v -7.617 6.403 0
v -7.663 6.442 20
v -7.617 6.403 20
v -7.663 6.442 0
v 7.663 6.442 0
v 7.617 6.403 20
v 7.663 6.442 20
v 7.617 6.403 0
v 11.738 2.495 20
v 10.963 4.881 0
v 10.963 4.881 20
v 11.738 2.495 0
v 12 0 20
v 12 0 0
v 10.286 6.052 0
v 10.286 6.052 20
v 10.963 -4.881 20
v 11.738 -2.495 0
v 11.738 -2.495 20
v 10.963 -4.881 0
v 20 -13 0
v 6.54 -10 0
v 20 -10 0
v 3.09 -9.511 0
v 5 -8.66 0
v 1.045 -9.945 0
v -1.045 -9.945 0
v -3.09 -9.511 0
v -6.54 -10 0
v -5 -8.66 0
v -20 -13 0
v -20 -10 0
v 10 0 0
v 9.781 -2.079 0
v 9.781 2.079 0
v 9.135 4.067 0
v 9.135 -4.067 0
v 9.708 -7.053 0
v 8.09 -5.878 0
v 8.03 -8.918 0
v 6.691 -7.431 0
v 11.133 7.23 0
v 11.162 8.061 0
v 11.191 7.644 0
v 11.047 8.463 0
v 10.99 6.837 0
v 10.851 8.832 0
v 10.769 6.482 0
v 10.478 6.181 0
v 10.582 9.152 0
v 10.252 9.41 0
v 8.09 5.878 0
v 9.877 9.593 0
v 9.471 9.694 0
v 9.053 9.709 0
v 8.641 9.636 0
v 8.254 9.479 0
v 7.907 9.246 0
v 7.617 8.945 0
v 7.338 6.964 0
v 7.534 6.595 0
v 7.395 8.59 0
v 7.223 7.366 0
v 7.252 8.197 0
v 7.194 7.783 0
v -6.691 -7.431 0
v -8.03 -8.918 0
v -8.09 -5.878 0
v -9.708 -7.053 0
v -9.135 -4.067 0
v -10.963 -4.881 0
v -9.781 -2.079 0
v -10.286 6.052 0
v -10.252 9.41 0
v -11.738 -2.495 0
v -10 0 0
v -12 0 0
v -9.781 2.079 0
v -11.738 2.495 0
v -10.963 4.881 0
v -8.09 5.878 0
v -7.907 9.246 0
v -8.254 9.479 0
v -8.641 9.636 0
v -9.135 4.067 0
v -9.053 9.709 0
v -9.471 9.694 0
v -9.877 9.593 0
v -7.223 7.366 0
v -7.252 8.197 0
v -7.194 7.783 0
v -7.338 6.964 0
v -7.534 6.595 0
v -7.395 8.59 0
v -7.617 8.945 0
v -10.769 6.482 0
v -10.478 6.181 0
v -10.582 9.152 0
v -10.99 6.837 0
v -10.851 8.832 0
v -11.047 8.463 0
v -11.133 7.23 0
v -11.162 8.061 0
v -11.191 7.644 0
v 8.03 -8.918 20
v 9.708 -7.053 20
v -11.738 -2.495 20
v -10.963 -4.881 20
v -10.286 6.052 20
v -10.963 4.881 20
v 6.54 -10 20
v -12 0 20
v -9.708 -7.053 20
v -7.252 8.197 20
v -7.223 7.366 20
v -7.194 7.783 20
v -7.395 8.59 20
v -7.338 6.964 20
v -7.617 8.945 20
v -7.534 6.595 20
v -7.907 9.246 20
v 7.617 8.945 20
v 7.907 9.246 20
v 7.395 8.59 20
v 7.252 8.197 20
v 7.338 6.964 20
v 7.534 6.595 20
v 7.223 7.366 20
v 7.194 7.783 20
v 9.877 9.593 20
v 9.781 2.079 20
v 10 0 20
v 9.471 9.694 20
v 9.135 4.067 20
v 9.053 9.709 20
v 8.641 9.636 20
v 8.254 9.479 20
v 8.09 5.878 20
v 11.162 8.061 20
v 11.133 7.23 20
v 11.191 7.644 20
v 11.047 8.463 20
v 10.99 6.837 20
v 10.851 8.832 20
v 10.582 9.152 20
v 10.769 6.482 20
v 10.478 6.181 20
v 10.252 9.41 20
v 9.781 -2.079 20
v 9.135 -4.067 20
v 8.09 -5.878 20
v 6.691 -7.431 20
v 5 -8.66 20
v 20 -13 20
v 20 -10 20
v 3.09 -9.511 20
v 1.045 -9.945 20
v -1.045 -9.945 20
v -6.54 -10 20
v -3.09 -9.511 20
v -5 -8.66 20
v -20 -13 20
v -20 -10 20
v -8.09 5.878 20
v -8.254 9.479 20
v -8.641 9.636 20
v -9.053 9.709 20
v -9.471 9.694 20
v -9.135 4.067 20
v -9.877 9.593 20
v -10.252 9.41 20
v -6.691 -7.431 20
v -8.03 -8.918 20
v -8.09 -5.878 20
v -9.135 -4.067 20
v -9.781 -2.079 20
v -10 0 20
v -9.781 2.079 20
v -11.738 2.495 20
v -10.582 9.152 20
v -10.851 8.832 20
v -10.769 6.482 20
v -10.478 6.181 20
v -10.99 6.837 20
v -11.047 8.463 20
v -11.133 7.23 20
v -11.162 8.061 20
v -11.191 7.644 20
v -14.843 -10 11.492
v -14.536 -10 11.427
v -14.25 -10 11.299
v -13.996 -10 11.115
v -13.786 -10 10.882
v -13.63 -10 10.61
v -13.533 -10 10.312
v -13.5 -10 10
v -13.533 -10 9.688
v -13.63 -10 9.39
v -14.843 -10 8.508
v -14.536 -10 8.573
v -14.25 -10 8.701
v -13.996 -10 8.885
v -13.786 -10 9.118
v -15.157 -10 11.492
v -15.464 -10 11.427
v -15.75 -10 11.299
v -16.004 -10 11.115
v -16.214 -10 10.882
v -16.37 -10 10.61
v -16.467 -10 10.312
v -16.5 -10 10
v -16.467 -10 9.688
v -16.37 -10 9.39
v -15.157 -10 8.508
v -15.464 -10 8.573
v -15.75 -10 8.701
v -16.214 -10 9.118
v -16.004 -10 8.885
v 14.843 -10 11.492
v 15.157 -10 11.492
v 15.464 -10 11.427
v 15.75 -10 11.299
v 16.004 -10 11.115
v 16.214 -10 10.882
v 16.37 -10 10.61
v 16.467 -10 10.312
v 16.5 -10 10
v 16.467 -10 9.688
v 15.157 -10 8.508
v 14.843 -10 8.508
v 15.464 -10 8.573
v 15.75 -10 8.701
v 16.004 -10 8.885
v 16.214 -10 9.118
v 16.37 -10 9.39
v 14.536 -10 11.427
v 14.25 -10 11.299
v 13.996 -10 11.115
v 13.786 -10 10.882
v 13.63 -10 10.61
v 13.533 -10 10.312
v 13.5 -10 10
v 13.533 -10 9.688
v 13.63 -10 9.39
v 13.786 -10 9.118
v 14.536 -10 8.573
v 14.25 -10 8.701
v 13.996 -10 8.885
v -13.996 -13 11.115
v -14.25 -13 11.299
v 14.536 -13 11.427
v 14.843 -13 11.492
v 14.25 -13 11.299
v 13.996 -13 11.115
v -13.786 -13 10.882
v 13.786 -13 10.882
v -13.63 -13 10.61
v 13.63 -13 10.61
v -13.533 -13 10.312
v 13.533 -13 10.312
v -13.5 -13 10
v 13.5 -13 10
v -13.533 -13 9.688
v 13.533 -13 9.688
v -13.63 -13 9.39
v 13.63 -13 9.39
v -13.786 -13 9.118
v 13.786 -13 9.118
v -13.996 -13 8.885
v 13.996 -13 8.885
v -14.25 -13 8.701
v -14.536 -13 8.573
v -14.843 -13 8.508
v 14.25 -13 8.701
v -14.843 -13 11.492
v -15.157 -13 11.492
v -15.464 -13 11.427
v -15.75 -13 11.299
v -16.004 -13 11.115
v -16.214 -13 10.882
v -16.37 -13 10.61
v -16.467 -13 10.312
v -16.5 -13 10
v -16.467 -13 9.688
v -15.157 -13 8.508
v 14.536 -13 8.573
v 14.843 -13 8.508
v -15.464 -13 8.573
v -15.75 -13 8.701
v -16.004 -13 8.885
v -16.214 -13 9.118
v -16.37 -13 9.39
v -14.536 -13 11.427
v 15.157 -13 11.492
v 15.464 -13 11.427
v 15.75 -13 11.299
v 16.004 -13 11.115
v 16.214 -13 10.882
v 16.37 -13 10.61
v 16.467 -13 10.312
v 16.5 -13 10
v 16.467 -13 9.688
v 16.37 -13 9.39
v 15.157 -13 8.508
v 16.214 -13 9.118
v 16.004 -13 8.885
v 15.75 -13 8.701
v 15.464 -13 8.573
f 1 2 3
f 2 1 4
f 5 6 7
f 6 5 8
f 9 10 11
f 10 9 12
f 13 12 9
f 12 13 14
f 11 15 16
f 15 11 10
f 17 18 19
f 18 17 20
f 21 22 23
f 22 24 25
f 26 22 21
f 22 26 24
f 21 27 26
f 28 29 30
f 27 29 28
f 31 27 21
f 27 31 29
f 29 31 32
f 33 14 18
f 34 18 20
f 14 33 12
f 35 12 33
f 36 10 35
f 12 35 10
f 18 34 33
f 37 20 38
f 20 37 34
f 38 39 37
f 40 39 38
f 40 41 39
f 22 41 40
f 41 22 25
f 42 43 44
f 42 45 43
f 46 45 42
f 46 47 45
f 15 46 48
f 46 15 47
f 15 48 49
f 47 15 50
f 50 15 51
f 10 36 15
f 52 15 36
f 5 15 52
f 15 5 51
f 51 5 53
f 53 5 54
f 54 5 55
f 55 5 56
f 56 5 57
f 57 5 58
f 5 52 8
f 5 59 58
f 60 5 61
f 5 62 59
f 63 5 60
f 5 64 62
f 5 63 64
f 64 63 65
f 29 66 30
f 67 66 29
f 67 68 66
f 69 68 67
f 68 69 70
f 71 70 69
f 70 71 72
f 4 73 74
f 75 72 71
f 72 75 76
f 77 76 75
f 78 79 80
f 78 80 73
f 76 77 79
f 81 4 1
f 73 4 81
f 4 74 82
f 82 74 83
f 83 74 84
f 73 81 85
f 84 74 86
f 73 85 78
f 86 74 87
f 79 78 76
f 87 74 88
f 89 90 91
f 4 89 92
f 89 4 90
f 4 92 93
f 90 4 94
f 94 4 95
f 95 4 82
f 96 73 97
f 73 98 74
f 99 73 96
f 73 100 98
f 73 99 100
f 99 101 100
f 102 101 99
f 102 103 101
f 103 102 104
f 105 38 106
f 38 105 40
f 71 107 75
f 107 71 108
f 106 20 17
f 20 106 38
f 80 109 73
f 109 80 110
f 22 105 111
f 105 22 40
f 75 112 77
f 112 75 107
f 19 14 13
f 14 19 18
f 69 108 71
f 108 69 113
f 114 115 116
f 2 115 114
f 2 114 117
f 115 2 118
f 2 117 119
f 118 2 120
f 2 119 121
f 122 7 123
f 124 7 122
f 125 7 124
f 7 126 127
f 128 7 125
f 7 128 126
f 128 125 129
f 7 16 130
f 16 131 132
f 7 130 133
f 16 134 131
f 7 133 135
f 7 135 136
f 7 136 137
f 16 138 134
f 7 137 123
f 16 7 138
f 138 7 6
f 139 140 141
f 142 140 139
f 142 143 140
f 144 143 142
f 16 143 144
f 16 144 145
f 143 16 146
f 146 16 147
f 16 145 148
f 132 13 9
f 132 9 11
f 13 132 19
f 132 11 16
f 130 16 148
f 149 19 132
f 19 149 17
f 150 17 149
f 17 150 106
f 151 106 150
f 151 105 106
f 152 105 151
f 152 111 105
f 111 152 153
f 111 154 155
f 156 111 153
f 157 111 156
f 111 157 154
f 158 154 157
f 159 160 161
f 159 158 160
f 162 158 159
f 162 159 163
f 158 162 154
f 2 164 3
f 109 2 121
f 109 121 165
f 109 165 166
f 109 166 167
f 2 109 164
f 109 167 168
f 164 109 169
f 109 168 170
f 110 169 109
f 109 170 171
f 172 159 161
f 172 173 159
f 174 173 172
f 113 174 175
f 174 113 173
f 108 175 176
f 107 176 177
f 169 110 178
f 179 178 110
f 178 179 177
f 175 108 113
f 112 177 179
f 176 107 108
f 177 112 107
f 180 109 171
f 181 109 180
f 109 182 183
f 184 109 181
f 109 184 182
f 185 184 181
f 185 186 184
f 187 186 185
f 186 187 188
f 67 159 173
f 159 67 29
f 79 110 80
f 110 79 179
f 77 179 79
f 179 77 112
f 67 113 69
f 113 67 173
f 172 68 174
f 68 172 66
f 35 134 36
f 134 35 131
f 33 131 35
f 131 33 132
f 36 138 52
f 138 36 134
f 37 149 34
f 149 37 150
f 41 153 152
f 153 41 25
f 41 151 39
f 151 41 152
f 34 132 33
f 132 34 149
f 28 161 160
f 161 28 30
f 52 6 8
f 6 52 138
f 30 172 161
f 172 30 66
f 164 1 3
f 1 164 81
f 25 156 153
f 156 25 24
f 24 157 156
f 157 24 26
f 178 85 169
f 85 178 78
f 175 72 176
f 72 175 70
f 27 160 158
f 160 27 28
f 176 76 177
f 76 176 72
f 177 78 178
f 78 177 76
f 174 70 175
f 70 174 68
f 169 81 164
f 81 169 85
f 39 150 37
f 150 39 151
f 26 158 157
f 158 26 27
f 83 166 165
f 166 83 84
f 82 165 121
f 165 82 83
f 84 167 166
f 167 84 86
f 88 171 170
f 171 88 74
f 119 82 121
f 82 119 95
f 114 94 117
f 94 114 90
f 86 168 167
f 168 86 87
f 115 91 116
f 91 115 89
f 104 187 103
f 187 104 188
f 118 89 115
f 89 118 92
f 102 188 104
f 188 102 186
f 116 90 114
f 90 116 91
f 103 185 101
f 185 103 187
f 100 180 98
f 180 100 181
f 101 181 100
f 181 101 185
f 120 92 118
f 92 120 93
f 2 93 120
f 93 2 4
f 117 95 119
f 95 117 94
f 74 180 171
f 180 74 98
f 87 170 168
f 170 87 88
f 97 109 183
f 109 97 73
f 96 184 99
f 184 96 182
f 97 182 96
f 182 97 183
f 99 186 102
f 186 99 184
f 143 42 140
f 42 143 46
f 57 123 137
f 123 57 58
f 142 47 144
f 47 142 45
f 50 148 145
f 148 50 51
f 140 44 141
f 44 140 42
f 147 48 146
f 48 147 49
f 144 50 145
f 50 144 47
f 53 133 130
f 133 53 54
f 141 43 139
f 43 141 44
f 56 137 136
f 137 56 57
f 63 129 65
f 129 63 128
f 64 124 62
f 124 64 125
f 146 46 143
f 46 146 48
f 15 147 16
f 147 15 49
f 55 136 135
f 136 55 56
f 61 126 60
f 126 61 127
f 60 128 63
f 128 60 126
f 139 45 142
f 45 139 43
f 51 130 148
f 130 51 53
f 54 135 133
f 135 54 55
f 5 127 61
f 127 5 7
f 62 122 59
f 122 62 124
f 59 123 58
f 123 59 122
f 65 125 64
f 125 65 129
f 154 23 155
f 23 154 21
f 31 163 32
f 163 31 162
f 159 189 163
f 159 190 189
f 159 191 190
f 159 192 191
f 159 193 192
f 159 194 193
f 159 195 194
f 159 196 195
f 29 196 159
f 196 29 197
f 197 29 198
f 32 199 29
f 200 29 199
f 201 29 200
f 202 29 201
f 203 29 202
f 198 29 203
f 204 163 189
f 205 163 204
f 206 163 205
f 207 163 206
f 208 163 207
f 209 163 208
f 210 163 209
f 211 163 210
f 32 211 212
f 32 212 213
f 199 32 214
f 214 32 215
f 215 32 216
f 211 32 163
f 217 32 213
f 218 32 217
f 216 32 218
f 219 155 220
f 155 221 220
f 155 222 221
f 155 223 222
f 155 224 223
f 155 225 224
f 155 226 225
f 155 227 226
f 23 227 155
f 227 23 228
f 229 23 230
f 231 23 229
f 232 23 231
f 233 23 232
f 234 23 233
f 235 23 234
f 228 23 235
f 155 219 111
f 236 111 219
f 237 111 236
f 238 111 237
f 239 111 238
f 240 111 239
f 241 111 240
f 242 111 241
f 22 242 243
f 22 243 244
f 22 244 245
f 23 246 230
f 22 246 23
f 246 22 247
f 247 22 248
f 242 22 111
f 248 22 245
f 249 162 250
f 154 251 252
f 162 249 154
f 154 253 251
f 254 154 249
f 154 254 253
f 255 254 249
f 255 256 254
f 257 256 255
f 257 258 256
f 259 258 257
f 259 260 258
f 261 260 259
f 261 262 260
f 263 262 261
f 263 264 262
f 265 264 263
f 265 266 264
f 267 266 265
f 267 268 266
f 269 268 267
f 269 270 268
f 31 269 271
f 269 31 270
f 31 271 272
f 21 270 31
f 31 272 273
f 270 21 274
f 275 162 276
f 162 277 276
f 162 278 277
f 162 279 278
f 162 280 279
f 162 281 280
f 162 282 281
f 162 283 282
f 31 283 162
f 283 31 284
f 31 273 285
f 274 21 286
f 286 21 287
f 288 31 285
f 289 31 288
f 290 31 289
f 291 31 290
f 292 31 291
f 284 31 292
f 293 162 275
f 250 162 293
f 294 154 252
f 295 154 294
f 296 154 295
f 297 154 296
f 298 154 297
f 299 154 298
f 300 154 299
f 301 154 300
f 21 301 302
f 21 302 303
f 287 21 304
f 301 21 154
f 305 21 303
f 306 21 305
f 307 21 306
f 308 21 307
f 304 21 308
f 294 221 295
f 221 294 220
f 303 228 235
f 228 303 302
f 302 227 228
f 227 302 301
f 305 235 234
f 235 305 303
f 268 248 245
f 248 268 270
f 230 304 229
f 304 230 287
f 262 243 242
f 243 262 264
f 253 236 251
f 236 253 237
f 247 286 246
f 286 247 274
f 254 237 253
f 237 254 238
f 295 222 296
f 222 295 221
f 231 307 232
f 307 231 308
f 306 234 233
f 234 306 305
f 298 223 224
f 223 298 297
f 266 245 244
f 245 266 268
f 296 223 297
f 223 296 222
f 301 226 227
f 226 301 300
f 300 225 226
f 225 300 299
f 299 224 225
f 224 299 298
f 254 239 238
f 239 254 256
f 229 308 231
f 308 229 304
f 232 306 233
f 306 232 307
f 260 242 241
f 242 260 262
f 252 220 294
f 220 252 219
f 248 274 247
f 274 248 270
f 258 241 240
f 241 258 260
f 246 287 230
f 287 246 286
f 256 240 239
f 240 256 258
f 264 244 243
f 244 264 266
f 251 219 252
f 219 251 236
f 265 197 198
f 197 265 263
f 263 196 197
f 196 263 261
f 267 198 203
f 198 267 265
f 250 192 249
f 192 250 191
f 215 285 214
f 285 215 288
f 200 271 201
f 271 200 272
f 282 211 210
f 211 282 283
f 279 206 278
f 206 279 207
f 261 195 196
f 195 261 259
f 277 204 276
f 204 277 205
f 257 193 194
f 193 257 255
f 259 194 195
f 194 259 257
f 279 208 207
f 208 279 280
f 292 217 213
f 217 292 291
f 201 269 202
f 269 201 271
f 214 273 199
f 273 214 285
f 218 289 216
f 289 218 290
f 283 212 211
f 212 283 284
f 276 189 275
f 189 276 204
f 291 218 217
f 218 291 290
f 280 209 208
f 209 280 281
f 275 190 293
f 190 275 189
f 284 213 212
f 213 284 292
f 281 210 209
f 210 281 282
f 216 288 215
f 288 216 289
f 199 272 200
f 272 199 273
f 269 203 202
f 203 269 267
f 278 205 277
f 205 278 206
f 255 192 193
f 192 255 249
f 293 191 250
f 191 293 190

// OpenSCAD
// Parametric Round Clip Holder
// Generates an adjustable set of round clips with mounting ears
// Garrett Mace April 7th 2011
// moded for makerbot custiomizer by jhack 25/3/2013


// Parameters
// Number of clips on the bracket
clipNumber = 1;		//[1:50]		
// Distance between clip centers
clipSpacing = 30;	//[1:100]	
// Diameter of the clip inside face		
clipInnerDiameter = 20;//[5:100]
// Width (height) of clip
clipWidth = 20;		//[5:100]		
// Thickness of clip walls
clipWallThickness = 2;	//[2:10]
// Amount of clip ring to remove from top (valid between 0 and 180)
clipOpeningAngle = 100;//[0:180]	
	
// Thickness of mounting bracket
bracketThickness = 3;	//[2:10]	
// Length of mounting ears from center of first and last clips
mountEarsLength = 20;	//[5:100]		
// Position of mounting holes from edge of mounting ears
mountHoleOffset = 5;	//[2:10]		
// Diameter of the mounting holes
mountHoleDiameter = 3;	 //[1:10]	

/* [hidden] */
$fs = 0.25;

// Round clip
module roundClip() {
difference() {
	cylinder(r = (clipInnerDiameter/2 + clipWallThickness), h = clipWidth);
	translate([0,0,-1]) cylinder(r = clipInnerDiameter/2, h = clipWidth + 2);
	translate([0,0,-1]) union () {
		rotate([0,0,clipOpeningAngle/4-0.05]) intersection() {
			rotate([0,0,clipOpeningAngle/4]) cube([clipInnerDiameter+clipWallThickness+1,clipInnerDiameter+clipWallThickness+1,clipWidth+2]);
			rotate ([0,0,-clipOpeningAngle/4]) translate([-(clipInnerDiameter+clipWallThickness+1),0,0]) cube([clipInnerDiameter+clipWallThickness+1,clipInnerDiameter+clipWallThickness+1,clipWidth+2]);
			cylinder(r=clipInnerDiameter+clipWallThickness+1,h=clipWidth+2);
		}

		rotate([0,0,-clipOpeningAngle/4+0.05]) intersection() {
			rotate([0,0,clipOpeningAngle/4]) cube([clipInnerDiameter+clipWallThickness+1,clipInnerDiameter+clipWallThickness+1,clipWidth+2]);
			rotate ([0,0,-clipOpeningAngle/4]) translate([-(clipInnerDiameter+clipWallThickness+1),0,0]) cube([clipInnerDiameter+clipWallThickness+1,clipInnerDiameter+clipWallThickness+1,clipWidth+2]);
			cylinder(r=clipInnerDiameter+clipWallThickness+1,h=clipWidth+2);
		}
	}
}

rotate([0,0,clipOpeningAngle/2]) translate([0,clipInnerDiameter/2+clipWallThickness,0]) cylinder(r = clipWallThickness, h = clipWidth);
//#rotate([0,0,clipOpeningAngle/2]) translate([0,clipInnerDiameter/2+clipWallThickness*2,0]) cylinder(r = clipWallThickness, h = clipWidth);

rotate([0,0,-clipOpeningAngle/2]) translate([0,clipInnerDiameter/2+clipWallThickness,0]) cylinder(r = clipWallThickness, h = clipWidth);
}

// Create clips
translate([-(clipSpacing*(clipNumber-1))/2,0,0]) for (clipPos = [0:clipNumber-1]) {
	translate([clipPos*clipSpacing,0,0]) roundClip();
}

// Calculations
calcs_bracketLength = clipSpacing*(clipNumber-1)+mountEarsLength*2;

// Mounting bracket and holes
difference() {
	translate([-calcs_bracketLength/2,-clipInnerDiameter/2-bracketThickness,0]) cube([calcs_bracketLength,bracketThickness,clipWidth]);
	translate([calcs_bracketLength/2-mountHoleOffset,-clipInnerDiameter/2-bracketThickness-1,clipWidth/2]) rotate([-90,0,0]) cylinder(r = mountHoleDiameter/2, h = bracketThickness+2);
	translate([-calcs_bracketLength/2+mountHoleOffset,-clipInnerDiameter/2-bracketThickness-1,clipWidth/2]) rotate([-90,0,0]) cylinder(r = mountHoleDiameter/2, h = bracketThickness+2);

}
